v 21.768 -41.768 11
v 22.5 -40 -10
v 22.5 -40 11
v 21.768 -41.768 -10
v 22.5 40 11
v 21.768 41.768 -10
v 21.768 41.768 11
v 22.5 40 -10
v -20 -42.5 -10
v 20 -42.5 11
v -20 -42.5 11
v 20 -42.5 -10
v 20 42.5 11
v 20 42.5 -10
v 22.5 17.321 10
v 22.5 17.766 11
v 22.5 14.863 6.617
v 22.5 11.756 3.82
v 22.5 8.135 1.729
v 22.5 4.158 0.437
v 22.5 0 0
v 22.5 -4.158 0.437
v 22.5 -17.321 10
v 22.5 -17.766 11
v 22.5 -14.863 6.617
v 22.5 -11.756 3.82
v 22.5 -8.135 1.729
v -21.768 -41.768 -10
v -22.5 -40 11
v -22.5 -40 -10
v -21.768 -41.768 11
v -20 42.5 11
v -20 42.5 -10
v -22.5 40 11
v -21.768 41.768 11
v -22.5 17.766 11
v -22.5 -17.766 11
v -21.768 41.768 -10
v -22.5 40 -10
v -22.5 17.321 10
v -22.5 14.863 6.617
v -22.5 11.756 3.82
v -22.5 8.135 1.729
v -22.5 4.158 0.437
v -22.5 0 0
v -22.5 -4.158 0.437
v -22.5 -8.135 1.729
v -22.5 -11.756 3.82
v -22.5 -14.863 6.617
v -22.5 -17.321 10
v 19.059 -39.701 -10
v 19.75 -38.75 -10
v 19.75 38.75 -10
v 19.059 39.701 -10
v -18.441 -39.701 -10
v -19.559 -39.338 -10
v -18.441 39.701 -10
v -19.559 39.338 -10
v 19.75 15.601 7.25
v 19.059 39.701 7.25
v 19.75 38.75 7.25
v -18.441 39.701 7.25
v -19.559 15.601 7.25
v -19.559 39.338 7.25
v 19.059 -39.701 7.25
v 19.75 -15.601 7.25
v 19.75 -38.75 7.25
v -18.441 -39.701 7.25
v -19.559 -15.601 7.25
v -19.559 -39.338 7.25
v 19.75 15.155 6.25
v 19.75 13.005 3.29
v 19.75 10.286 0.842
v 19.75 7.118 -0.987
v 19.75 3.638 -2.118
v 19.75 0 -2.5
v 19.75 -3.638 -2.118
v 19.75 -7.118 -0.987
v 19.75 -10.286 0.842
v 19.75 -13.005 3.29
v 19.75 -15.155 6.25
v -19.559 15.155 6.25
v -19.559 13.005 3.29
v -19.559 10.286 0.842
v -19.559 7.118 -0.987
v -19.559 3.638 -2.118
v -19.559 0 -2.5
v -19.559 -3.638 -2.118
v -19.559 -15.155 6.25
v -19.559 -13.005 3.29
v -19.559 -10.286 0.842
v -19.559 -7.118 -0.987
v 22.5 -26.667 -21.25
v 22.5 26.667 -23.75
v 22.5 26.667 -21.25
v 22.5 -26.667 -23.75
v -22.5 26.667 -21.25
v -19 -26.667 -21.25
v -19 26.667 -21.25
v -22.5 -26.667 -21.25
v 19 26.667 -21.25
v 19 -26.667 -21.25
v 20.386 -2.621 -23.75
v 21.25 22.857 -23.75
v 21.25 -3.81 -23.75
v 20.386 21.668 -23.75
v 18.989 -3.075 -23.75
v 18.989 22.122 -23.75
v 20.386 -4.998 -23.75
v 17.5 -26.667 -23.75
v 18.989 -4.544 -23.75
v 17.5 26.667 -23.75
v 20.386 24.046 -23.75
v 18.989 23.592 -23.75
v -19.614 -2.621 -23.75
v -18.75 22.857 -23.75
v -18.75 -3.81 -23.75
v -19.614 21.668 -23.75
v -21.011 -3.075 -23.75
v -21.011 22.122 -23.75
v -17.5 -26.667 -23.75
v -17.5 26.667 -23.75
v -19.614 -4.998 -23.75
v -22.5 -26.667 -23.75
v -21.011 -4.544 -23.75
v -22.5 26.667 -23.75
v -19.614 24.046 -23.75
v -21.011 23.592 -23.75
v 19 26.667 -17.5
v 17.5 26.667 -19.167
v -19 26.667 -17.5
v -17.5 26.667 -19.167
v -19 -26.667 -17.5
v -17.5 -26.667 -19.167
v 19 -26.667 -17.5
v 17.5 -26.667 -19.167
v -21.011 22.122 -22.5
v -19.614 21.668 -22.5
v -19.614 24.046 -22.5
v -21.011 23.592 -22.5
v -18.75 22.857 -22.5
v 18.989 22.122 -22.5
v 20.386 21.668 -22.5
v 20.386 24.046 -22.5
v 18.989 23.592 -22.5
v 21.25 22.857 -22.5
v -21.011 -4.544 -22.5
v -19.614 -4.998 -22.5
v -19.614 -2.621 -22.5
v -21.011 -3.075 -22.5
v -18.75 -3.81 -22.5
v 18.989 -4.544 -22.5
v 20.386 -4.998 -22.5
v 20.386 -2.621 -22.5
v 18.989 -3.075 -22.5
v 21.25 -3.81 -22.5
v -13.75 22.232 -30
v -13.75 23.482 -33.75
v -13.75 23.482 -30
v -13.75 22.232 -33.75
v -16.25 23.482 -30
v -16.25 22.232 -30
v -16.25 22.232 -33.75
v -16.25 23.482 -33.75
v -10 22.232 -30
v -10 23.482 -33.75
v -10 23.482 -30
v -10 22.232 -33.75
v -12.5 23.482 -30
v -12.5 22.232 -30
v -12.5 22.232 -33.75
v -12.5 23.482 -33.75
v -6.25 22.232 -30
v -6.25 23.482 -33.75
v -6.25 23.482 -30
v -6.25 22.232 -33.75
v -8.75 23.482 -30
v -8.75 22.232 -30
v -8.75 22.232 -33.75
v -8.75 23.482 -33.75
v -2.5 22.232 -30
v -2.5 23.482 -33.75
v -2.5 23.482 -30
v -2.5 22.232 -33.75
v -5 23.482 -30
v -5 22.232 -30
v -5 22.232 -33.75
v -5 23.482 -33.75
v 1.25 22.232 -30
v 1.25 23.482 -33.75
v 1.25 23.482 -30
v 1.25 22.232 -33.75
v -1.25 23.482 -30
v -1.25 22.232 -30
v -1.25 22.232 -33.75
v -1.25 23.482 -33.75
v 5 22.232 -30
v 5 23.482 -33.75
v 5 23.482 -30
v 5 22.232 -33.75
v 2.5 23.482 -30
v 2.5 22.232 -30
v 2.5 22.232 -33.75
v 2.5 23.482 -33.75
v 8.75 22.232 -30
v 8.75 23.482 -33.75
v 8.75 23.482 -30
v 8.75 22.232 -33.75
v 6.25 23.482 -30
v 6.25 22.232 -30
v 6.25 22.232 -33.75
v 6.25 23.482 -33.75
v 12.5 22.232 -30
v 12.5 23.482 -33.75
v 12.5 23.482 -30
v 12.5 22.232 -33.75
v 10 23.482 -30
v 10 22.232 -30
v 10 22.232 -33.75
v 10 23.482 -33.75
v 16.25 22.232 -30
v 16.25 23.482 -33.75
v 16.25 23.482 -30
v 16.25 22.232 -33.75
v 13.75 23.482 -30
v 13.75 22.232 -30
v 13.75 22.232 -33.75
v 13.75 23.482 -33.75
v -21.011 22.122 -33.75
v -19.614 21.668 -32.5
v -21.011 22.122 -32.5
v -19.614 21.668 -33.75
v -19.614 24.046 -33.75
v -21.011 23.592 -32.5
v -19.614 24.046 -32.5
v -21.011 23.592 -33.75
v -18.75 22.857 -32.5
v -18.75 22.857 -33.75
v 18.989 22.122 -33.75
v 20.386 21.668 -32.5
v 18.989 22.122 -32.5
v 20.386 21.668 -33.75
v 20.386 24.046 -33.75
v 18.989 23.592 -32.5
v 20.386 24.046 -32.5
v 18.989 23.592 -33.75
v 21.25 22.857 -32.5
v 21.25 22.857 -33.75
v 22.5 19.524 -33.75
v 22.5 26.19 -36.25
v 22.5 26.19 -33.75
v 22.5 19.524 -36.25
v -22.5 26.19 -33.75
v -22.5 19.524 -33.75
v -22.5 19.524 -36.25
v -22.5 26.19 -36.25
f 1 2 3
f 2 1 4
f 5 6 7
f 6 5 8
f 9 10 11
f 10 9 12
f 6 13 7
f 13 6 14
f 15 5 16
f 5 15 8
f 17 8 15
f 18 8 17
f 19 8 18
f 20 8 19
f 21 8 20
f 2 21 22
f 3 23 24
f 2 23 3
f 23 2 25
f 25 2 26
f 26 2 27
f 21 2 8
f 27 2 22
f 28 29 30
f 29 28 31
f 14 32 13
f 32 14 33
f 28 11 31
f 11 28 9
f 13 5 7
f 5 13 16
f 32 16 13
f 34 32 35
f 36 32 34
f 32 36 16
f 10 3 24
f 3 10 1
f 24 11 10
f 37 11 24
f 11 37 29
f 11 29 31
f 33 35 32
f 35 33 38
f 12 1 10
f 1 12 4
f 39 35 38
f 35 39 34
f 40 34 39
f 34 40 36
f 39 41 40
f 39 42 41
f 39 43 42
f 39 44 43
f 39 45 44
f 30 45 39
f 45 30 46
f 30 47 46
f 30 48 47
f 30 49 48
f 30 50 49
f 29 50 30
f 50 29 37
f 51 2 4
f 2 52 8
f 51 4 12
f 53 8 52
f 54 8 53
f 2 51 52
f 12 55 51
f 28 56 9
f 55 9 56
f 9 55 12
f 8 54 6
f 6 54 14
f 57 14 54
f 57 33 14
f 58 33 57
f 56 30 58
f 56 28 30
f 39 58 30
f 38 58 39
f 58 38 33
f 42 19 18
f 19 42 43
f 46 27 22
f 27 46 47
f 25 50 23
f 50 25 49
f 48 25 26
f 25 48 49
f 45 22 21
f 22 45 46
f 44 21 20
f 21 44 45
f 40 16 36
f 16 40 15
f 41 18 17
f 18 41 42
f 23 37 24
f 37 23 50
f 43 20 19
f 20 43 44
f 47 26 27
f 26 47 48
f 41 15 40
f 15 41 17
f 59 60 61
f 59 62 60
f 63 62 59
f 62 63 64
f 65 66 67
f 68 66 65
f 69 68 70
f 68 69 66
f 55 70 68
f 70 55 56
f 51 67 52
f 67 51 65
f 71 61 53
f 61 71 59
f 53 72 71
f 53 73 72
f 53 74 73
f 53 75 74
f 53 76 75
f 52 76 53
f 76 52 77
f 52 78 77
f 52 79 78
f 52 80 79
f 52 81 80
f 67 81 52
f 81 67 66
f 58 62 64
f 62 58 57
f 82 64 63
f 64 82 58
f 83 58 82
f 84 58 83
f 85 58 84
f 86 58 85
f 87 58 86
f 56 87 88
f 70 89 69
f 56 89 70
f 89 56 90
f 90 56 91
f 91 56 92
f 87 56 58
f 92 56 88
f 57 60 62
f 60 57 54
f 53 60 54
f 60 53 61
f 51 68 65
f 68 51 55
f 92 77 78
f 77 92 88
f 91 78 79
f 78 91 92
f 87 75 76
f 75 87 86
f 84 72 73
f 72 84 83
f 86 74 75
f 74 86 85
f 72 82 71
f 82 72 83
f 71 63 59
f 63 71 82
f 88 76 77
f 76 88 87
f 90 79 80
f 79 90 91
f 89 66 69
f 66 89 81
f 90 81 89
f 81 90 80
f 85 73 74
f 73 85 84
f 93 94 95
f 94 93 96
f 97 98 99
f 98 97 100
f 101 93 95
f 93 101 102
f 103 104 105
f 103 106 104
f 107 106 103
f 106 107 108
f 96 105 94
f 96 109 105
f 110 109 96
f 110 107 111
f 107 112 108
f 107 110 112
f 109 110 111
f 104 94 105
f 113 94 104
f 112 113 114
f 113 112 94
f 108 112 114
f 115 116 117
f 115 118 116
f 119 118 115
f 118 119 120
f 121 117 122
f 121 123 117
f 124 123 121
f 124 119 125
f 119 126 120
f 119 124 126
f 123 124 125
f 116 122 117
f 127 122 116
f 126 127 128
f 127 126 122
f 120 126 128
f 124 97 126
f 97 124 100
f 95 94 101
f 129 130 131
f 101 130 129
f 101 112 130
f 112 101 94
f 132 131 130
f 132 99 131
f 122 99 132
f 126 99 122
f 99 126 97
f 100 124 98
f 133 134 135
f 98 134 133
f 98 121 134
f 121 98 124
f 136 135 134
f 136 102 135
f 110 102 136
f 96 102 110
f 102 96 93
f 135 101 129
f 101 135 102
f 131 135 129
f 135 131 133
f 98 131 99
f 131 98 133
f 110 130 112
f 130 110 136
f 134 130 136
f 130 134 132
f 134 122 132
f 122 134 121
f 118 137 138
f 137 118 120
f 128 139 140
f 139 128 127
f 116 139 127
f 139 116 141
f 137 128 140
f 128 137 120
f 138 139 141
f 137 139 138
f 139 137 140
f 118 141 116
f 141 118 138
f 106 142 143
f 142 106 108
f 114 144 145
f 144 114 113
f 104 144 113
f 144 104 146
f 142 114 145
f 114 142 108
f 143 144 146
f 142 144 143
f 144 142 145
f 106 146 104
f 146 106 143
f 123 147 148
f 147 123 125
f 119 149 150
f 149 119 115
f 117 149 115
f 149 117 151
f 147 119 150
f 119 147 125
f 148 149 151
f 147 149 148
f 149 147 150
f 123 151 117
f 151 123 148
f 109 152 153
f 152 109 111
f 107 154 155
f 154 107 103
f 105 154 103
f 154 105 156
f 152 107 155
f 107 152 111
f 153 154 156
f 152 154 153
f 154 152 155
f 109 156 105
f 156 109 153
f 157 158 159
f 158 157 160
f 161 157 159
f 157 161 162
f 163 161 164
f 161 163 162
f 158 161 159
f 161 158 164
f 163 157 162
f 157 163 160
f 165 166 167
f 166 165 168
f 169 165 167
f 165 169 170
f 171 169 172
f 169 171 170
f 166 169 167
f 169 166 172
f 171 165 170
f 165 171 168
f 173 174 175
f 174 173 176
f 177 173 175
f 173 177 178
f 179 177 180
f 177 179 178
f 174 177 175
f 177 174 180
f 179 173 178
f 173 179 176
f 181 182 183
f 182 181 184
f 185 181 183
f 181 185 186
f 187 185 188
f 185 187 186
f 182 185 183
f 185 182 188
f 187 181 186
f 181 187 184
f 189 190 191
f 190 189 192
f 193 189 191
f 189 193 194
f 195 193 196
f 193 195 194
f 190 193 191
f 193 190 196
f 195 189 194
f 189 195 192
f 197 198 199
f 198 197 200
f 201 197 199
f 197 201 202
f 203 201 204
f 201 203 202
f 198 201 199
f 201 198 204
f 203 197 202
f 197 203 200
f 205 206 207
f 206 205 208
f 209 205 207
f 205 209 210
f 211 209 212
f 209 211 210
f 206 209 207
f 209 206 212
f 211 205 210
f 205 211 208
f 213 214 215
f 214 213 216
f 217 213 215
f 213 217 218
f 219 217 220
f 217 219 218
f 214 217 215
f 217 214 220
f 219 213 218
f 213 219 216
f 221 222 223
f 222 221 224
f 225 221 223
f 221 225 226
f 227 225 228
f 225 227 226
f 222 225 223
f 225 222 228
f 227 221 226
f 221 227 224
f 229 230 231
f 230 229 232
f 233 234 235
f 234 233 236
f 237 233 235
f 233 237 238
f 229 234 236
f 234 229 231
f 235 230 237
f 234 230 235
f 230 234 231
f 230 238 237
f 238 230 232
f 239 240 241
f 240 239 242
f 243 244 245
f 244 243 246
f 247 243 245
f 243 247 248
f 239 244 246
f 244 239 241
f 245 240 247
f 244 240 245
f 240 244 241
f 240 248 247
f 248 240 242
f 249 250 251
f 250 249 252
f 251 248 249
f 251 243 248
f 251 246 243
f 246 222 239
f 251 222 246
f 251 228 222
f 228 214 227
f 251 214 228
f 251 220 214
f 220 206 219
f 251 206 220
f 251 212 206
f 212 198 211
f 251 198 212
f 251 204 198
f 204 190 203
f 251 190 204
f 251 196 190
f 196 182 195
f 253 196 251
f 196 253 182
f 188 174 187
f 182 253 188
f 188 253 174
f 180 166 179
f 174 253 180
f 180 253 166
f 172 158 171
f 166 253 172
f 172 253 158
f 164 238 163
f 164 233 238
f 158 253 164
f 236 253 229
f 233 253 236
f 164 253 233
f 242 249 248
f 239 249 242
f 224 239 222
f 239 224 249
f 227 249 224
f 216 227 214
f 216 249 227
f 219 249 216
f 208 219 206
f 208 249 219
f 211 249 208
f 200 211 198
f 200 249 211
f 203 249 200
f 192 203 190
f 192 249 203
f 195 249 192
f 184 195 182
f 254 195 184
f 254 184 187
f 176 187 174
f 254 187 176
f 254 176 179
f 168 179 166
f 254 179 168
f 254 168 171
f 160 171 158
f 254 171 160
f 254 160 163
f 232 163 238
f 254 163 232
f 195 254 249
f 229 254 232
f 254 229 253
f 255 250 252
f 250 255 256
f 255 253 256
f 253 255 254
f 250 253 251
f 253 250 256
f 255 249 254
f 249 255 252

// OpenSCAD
// DIYbio EasyPhoresis
// by alec_djinn 2014
// www.diybiogroningen.org
// Version: beta 1

// dimensions
width = 40;
height = 20;
depth = 80;
thickness = 2.5;


// body shape
module body(width,height,depth,thickness){
	difference() {
		minkowski(){
			cube([width,depth,height], center=true);
			cylinder(r=thickness, h=1);
		}
		translate([0,0,height]){
			rotate([0,90,0]){
				cylinder (h=2*width, r=height, center=true);
			}
		}
	}
}


module gel(width,height,depth,thickness){
	translate([0,0,-height]){
	difference(){
		difference(){
			union(){
				translate([0,0,-height/8]){
					cube([width+2*thickness,depth/1.5,height/8], center=true);
				}
				cube([width-2,depth/1.5,height/4], center=true);
			}
			translate([0,0,-height/12]){
				cube([width-(2*thickness),depth/1.2,height/4], center=true);
			}
		}
		// comb holder
		translate([-width/2,depth/3.5,-2*thickness]){
			cylinder(h=thickness, r=thickness/2);
		}
		translate([width/2,depth/3.5,-2*thickness]){
			cylinder(h=thickness, r=thickness/2);
		}
		translate([-width/2,-depth/(6*3.5),-2*thickness]){
			cylinder(h=thickness, r=thickness/2);
		}
		translate([width/2,-depth/(6*3.5),-2*thickness]){
			cylinder(h=thickness, r=thickness/2);
		}
	}
	}
}

// 9 wells comb
module comb(width,height,depth,thickness){
	translate([0,0,-1.5*height]){
		union(){
			translate([-width/2,depth/3.5,-2*thickness]){
				cylinder(h=thickness, r=thickness/2);
			}
			translate([width/2,depth/3.5,-2*thickness]){
				cylinder(h=thickness, r=thickness/2);
			}
			translate([0,depth/3.5,(-height/8)-thickness]){
				cube([width+2*thickness,depth/12,height/8],center=true);	
			}
			translate([thickness/2,0,0]){
				// numbers of wells
				for(n=[1:2.4*width/10]){
					translate([(-width/2)+thickness*n*1.5,depth/3.5,-height/10]){
						cube([thickness,depth/64,height/5],center=true);	
					}
				}
			}
		}
	}
}

// body: shape - void
difference(){
	body(width,height,depth,thickness);
	translate([0,0,-thickness]){
		body(width-thickness,height-thickness,depth-thickness);
	}
}

// gel
gel(width,height,depth,thickness);

// comb
comb(width,height,depth,thickness);
